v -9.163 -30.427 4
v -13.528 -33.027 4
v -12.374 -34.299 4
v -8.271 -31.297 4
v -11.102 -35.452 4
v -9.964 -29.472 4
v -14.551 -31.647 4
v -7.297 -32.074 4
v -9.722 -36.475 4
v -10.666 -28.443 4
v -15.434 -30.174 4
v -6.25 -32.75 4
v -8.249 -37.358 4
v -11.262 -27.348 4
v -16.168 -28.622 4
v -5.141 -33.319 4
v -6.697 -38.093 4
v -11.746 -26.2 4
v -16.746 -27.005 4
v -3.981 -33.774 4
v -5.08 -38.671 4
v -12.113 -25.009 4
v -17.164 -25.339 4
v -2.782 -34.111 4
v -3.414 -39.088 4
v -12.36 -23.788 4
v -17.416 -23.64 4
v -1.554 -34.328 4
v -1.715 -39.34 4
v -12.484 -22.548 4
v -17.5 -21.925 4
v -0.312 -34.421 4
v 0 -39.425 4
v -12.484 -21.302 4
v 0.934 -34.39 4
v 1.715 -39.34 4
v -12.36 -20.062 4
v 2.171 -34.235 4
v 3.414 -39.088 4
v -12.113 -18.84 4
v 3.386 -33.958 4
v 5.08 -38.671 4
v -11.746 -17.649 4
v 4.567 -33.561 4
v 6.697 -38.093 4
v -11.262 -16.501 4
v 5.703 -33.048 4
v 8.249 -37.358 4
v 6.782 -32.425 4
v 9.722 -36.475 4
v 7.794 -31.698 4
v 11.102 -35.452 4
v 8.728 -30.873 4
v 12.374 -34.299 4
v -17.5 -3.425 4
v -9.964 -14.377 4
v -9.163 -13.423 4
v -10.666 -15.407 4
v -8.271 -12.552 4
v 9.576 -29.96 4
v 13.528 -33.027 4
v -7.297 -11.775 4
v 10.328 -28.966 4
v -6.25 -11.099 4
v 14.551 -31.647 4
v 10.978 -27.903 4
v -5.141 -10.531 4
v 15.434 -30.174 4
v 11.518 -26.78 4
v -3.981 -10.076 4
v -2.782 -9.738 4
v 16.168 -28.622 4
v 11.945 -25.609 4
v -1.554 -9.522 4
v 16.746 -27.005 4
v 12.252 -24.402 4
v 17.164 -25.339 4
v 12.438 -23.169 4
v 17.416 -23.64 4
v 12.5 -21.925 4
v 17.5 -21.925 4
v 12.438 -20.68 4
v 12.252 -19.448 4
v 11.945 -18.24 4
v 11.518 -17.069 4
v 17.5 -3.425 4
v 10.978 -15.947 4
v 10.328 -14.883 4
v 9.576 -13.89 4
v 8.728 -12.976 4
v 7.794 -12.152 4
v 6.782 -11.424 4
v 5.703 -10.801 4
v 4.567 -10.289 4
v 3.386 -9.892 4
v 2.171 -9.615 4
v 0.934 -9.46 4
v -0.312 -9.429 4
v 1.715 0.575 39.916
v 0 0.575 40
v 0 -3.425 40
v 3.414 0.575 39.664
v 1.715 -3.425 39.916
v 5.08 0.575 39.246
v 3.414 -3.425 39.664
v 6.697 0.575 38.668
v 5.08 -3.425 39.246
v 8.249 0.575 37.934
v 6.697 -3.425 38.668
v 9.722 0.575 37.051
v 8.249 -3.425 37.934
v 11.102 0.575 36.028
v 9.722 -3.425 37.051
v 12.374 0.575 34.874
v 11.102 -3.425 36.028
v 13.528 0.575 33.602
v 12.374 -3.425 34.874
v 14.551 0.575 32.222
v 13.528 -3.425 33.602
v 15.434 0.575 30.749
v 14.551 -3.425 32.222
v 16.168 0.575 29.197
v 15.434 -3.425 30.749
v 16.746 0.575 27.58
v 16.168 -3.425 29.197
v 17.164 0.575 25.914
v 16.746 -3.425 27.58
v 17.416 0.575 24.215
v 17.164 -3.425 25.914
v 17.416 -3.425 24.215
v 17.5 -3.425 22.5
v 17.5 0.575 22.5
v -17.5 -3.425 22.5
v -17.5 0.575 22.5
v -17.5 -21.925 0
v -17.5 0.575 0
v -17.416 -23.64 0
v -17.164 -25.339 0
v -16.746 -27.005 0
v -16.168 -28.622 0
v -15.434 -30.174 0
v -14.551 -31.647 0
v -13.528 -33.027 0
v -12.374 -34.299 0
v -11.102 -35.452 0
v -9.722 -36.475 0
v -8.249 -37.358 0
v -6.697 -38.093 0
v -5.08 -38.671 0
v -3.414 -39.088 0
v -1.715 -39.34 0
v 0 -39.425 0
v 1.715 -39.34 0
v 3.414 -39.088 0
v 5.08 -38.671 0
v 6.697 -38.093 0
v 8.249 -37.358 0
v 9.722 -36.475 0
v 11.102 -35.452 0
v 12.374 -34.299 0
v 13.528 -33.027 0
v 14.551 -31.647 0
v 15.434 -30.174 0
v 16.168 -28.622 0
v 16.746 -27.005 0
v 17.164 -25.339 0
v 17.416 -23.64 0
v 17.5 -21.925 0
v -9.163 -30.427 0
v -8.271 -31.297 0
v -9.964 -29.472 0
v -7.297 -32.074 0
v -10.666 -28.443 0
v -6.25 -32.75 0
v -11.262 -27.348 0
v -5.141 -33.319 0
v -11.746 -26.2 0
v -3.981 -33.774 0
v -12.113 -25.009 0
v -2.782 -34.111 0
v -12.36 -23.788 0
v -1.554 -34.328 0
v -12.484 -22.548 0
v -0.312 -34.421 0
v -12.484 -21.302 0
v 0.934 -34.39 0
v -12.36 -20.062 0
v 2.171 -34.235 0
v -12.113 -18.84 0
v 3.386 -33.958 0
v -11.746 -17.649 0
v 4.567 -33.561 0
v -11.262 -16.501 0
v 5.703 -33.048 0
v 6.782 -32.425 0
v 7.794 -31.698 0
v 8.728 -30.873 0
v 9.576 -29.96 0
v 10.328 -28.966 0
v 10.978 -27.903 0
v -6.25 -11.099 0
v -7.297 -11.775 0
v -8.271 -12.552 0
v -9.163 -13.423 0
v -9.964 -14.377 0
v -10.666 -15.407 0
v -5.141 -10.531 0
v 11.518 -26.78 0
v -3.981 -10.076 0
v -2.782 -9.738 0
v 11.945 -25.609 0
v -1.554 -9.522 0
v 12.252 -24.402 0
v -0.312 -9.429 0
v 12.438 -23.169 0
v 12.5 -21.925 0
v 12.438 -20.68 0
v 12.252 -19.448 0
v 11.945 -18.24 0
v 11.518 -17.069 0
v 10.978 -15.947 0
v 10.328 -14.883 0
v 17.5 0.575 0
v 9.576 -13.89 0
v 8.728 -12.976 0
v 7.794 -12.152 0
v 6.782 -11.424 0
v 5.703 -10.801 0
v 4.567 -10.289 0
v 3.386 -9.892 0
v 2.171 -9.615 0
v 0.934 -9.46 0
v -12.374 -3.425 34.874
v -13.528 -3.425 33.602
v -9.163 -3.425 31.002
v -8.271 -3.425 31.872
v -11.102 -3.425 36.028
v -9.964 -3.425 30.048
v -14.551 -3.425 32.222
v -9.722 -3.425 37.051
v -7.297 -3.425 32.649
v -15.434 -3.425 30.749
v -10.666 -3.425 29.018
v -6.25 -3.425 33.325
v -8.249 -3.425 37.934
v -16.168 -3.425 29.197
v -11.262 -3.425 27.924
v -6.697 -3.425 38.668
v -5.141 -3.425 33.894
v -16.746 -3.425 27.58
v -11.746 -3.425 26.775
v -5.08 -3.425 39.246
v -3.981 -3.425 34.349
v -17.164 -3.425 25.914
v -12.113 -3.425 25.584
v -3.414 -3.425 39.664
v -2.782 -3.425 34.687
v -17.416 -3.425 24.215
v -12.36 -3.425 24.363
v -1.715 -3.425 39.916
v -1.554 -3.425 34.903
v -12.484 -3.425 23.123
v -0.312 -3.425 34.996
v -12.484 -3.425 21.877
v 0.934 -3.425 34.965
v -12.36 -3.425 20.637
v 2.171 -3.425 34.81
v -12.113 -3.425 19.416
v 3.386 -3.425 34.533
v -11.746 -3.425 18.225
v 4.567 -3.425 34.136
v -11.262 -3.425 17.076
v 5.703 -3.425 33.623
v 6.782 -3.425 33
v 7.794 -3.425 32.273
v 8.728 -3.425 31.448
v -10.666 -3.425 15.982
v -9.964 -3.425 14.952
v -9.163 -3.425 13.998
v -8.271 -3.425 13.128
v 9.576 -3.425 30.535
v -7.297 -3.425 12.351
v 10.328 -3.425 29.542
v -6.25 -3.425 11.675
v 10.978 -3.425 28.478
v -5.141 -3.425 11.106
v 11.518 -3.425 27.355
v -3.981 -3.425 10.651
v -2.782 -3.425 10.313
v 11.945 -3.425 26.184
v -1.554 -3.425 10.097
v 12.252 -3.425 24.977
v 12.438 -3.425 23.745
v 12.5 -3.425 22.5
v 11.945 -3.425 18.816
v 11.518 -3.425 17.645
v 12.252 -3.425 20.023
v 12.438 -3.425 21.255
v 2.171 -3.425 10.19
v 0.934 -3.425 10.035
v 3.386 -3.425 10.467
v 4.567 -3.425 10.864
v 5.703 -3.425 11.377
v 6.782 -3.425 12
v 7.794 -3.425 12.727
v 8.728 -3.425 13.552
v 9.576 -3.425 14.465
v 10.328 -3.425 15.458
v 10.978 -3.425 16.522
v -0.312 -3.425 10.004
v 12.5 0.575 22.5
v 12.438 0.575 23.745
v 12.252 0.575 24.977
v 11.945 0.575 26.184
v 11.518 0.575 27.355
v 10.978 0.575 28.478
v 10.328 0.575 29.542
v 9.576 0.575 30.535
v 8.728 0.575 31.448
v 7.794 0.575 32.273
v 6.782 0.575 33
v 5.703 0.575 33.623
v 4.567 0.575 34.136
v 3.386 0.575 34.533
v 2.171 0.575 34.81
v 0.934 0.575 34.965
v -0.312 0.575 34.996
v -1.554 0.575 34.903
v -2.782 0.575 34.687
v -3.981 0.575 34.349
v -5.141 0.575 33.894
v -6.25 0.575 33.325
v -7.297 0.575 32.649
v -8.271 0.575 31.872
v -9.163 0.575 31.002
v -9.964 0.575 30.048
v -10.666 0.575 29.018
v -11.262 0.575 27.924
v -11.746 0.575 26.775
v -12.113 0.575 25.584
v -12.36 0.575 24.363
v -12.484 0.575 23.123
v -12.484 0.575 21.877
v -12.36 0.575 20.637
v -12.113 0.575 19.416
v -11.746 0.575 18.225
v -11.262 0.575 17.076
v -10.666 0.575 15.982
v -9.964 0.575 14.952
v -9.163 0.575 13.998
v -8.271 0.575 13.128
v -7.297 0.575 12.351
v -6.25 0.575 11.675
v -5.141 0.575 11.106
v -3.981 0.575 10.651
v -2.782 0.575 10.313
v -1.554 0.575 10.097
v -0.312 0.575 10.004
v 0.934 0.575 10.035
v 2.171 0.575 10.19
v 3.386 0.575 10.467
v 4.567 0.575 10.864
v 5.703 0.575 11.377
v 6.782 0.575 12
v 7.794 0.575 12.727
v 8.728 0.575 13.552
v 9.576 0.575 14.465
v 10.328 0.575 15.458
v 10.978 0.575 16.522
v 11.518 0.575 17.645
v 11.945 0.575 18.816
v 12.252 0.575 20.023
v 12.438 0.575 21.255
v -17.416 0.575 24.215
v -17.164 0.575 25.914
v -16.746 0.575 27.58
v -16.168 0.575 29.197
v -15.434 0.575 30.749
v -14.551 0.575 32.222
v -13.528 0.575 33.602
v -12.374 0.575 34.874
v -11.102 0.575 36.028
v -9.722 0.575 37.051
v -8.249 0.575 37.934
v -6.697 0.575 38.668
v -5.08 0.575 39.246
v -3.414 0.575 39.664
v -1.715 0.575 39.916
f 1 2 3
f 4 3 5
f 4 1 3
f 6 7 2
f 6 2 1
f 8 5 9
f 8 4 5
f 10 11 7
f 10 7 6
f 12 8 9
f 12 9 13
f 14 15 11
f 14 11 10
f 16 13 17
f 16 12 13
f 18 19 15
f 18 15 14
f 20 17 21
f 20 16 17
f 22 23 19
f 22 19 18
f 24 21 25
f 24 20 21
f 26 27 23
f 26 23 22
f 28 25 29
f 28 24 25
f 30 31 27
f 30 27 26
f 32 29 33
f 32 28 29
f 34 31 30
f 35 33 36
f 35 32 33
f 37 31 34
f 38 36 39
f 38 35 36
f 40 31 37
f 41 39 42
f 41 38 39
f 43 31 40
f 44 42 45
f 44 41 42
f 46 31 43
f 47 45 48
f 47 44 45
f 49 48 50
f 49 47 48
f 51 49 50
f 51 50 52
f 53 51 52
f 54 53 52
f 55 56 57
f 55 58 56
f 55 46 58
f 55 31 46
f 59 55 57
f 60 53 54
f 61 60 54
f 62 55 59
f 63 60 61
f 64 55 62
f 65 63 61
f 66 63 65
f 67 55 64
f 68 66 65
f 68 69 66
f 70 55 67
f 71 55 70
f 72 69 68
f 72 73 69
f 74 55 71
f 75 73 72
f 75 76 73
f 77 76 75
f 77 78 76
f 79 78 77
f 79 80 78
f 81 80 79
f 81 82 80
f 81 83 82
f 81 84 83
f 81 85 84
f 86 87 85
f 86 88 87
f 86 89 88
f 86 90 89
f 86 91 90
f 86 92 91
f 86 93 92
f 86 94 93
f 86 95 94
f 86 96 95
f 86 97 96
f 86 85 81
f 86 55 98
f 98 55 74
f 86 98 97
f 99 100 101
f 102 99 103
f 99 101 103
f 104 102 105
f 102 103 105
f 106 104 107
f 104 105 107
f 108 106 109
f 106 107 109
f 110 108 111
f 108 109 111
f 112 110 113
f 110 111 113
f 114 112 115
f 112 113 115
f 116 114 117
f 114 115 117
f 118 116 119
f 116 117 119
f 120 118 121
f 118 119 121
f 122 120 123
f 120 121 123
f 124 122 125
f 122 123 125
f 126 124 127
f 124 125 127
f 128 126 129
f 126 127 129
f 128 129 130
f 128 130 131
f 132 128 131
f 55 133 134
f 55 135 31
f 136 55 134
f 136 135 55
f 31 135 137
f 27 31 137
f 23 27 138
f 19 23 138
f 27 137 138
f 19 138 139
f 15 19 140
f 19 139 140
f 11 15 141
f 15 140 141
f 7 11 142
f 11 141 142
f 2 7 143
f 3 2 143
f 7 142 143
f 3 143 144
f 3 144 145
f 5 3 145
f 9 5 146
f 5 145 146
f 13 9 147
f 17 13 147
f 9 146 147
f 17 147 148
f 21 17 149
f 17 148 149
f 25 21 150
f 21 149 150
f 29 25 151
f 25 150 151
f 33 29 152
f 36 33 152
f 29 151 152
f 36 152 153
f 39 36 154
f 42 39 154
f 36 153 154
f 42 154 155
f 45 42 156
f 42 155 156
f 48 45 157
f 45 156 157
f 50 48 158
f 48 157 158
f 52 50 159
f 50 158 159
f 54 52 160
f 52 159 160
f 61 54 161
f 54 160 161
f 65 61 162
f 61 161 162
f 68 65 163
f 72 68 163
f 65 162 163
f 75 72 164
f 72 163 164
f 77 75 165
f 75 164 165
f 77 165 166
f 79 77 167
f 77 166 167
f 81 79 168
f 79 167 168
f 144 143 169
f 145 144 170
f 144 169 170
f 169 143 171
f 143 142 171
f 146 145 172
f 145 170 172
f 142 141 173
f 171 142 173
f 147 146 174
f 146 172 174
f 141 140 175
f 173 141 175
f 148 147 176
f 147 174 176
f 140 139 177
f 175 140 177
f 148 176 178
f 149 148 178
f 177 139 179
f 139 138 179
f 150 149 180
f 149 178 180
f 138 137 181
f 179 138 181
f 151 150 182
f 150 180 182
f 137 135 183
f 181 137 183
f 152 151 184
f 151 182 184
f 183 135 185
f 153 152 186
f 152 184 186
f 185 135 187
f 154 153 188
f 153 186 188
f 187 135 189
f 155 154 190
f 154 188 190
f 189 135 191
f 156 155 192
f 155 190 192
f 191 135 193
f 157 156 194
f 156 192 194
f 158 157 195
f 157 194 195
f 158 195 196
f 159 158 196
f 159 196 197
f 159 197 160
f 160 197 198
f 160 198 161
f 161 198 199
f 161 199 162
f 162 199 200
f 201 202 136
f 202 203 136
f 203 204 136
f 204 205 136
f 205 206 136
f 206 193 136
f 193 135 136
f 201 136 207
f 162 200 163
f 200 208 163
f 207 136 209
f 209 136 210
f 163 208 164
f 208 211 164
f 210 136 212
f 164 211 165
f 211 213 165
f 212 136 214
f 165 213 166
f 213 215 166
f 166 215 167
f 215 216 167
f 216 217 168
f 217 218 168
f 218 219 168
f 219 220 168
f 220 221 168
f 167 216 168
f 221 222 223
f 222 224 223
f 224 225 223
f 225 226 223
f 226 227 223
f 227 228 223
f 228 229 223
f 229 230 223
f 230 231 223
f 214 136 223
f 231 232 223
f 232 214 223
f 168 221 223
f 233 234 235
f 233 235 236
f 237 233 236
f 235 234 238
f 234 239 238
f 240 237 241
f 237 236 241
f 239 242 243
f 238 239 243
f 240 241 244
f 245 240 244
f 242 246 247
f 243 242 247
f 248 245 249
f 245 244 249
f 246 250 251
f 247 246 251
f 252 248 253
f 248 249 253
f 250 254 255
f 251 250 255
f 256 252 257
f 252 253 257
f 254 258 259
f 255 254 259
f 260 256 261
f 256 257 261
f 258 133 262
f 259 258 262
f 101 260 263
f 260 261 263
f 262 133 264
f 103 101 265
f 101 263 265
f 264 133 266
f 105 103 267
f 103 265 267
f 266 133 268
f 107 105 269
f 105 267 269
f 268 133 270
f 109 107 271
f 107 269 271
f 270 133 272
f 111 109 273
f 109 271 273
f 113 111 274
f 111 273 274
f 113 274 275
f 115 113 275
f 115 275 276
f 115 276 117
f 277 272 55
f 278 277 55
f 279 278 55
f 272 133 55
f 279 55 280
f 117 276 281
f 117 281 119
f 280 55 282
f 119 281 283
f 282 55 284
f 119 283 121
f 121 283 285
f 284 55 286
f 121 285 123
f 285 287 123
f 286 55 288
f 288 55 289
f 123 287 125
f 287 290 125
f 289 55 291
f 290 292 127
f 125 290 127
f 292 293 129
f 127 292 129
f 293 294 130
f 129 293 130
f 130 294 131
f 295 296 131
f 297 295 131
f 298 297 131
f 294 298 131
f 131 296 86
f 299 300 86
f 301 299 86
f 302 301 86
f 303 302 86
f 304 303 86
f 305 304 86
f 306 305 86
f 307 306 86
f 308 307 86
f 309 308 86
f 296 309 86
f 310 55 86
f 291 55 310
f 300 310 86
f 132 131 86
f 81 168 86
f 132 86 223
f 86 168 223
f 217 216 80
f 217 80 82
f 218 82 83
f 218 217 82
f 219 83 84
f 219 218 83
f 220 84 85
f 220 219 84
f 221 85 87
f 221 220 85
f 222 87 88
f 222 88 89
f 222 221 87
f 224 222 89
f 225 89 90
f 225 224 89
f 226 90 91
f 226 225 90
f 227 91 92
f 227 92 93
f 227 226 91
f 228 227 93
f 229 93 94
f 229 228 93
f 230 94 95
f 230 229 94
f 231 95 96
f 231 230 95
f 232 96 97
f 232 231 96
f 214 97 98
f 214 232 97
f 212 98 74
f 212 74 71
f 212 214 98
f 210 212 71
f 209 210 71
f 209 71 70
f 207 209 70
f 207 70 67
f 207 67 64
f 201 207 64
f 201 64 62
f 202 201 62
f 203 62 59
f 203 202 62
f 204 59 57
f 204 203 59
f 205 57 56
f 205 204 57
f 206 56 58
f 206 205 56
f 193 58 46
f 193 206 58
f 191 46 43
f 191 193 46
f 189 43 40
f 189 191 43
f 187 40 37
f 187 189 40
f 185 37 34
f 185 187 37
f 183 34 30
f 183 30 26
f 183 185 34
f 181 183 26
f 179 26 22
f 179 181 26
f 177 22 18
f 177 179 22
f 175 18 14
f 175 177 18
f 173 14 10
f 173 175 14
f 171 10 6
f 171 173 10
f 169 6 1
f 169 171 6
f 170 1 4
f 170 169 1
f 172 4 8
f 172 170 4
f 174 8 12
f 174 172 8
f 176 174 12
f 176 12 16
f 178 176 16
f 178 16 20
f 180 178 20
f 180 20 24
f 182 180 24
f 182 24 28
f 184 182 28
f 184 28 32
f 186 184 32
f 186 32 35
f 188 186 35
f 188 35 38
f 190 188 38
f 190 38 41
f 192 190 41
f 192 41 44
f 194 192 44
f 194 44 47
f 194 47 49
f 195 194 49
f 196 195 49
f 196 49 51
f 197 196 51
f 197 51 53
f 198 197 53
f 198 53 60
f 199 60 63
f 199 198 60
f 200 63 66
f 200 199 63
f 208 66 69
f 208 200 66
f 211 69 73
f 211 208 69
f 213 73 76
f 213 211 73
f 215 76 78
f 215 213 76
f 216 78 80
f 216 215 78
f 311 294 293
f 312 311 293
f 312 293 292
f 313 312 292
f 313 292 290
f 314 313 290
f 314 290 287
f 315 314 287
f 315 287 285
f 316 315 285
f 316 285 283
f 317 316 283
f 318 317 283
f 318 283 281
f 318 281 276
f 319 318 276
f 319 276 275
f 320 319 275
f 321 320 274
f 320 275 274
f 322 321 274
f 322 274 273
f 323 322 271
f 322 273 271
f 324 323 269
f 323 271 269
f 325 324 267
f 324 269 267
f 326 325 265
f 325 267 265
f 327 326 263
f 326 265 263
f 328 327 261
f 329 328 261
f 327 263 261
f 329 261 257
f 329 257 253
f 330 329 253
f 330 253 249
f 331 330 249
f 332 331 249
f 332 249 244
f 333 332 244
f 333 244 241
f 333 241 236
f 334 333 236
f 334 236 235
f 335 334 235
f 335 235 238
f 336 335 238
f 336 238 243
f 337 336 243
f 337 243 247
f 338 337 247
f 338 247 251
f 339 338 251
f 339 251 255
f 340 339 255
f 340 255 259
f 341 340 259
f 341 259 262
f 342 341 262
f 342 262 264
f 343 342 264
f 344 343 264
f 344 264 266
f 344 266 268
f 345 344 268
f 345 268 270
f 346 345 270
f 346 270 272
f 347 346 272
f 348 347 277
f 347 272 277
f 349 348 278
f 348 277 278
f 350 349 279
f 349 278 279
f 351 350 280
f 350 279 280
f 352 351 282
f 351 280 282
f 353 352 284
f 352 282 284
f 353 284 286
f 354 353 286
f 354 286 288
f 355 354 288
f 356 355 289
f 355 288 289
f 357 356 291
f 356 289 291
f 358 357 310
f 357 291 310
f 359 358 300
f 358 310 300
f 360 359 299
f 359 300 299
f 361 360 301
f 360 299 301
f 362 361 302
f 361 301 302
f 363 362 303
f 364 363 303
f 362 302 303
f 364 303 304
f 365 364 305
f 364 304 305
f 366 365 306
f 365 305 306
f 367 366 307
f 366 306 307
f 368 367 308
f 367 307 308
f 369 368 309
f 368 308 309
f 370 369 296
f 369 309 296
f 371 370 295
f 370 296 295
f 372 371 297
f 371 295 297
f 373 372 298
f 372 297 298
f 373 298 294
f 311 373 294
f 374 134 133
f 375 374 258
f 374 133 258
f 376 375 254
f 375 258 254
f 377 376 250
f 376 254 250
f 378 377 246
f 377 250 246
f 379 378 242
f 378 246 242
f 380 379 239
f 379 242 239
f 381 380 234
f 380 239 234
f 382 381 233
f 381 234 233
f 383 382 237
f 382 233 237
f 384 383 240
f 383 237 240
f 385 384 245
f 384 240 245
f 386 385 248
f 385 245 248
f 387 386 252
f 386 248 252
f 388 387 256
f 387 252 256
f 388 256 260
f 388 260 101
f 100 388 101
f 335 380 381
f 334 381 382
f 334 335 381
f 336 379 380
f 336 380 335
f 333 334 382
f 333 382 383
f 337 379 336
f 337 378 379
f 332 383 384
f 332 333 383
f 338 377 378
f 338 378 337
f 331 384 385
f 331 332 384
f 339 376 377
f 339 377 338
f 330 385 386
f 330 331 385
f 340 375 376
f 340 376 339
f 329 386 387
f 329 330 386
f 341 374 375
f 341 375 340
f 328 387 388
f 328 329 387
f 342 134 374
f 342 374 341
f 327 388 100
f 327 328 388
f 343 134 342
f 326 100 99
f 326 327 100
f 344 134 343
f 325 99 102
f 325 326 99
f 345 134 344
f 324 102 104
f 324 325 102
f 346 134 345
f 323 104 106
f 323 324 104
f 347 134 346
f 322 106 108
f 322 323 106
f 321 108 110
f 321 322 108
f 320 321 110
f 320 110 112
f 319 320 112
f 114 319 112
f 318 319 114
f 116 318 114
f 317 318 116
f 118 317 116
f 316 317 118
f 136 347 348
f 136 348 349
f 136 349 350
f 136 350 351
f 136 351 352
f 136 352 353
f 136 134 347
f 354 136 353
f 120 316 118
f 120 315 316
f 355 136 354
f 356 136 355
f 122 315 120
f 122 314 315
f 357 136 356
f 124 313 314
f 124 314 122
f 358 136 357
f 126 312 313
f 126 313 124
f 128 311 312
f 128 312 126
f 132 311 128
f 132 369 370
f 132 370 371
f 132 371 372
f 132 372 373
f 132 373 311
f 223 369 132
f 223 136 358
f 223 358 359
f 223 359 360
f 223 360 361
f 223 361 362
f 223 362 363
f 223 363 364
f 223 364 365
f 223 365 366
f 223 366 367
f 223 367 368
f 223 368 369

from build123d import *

# Parameters (mm, degrees)
F0_R     = 12.5
F1_DEPTH = 4
F2_W     = 35
F2_H     = 4
F3_DEPTH = 36
F4_R     = 12.5
F5_DEPTH = 25


with BuildPart() as f1:
    # F0 (on Top) → F1 (new body)
    with BuildSketch(Plane.XY):
        with BuildLine():
            Line((17.5, 0.575275), (-17.5, 0.575275))
            Line((-17.5, 0.575275), (-17.5, -21.924725))
            ThreePointArc((-17.5, -21.924725), (0, -39.424725), (17.5, -21.924725))
            Line((17.5, -21.924725), (17.5, 0.575275))
        make_face()
        with Locations((0, -21.924725)):
            Circle(F0_R, mode=Mode.SUBTRACT)
    extrude(amount=F1_DEPTH)

    # F2 (on face) → F3 (join)
    with BuildSketch(Plane.XY.offset(4)):
        with Locations((0, -1.424725)):
            Rectangle(F2_W, F2_H)
    extrude(amount=F3_DEPTH)

    # F4 (on face) → F5 (cut)
    with BuildSketch(Plane.XZ.offset(3.424725)):
        with BuildLine():
            ThreePointArc((-17.5, 22.5), (-12.374369, 34.874369), (0, 40))
            Line((0, 40), (-17.5, 40))
            Line((-17.5, 40), (-17.5, 22.5))
        make_face()
        with BuildLine():
            ThreePointArc((0, 40), (12.374369, 34.874369), (17.5, 22.5))
            Line((17.5, 22.5), (17.5, 40))
            Line((17.5, 40), (0, 40))
        make_face()
        with Locations((0, 22.5)):
            Circle(F4_R)
    extrude(amount=-F5_DEPTH, mode=Mode.SUBTRACT)


solid = f1.part
